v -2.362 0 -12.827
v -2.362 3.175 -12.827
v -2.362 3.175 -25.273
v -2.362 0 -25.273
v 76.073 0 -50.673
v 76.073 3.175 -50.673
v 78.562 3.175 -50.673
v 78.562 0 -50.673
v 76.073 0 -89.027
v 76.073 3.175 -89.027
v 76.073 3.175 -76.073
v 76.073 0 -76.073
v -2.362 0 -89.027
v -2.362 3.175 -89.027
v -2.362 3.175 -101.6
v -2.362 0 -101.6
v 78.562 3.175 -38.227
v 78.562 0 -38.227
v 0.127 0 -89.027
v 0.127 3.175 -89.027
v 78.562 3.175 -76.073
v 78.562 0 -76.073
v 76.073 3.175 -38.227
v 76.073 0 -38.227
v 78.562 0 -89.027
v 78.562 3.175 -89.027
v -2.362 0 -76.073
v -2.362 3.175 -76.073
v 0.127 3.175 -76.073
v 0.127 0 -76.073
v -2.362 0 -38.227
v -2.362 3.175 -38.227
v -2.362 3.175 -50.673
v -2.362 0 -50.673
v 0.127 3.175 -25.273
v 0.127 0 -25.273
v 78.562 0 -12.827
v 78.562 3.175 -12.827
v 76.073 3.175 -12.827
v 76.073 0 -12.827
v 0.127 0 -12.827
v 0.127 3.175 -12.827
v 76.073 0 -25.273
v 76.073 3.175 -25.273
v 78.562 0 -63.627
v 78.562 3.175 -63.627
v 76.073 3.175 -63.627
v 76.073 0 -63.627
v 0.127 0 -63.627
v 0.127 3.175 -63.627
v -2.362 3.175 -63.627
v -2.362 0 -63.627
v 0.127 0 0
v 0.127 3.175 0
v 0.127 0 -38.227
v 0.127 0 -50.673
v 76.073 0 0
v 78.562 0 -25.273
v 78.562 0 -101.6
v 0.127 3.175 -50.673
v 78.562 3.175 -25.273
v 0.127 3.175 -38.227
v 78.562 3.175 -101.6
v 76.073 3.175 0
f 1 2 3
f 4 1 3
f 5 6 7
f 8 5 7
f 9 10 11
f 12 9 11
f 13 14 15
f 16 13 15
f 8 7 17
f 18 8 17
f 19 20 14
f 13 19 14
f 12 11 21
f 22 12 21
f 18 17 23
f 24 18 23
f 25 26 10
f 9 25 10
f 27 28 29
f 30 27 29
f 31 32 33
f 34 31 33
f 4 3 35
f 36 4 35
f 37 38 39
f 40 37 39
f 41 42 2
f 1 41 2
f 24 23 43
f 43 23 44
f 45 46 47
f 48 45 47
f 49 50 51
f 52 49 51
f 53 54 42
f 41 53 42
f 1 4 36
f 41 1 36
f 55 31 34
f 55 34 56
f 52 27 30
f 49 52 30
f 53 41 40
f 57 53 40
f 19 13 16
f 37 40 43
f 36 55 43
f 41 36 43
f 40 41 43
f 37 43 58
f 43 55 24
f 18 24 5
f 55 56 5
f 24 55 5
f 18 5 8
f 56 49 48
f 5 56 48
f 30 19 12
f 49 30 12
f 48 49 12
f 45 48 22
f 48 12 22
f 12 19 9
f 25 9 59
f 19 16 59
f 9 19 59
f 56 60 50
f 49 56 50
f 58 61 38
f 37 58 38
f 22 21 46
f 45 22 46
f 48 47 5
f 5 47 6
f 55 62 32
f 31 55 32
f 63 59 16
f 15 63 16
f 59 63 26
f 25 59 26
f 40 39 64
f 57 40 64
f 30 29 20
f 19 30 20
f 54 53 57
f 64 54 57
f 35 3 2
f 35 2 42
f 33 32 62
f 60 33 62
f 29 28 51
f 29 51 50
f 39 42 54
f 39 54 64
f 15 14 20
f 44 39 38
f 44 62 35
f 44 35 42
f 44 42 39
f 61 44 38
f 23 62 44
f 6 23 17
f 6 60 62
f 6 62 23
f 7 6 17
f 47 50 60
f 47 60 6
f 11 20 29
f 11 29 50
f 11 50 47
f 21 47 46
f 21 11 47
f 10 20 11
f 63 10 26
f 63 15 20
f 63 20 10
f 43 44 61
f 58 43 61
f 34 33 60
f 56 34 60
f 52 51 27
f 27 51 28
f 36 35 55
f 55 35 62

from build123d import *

# Parameters (mm, degrees)
BOSS_EXTRUDE1_DEPTH = 3.175
CUT_EXTRUDE1_DEPTH  = 4.175


with BuildPart() as part:
    # Sketch1 → Boss-Extrude1 (new body)
    with BuildSketch(Plane(origin=(0, 0, 0), x_dir=(1, 0, 0), z_dir=(0, 1, 0))):
        Polygon((0, 0), (76.2, 0), (76.2, 12.7), (78.6892, 12.7), (78.6892, 25.4), (76.2, 25.4), (76.2, 38.1), (78.6892, 38.1), (78.6892, 50.8), (76.2, 50.8), (76.2, 63.5), (78.6892, 63.5), (78.6892, 76.2), (76.2, 76.2), (76.2, 88.9), (78.6892, 88.9), (78.6892, 101.6), (-2.4892, 101.6), (-2.4892, 88.9), (0, 88.9), (0, 76.2), (-2.4892, 76.2), (-2.4892, 63.5), (0, 63.5), (0, 50.8), (-2.4892, 50.8), (-2.4892, 38.1), (0, 38.1), (0, 25.4), (-2.4892, 25.4), (-2.4892, 12.7), (0, 12.7), align=None)
    extrude(amount=BOSS_EXTRUDE1_DEPTH)

    # Sketch2 → Cut-Extrude1 (cut, through all)
    with BuildSketch(Plane(origin=(0, 3.175, 0), x_dir=(1, 0, 0), z_dir=(0, 1, 0))):
        Polygon((78.6892, 101.6), (78.5622, 101.6), (78.5622, 89.027), (76.073, 89.027), (76.073, 76.073), (78.5622, 76.073), (78.5622, 63.627), (76.073, 63.627), (76.073, 50.673), (78.5622, 50.673), (78.5622, 38.227), (76.073, 38.227), (76.073, 25.273), (78.5622, 25.273), (78.5622, 12.827), (76.073, 12.827), (76.073, 0), (76.2, 0), (76.2, 12.7), (78.6892, 12.7), (78.6892, 25.4), (76.2, 25.4), (76.2, 38.1), (78.6892, 38.1), (78.6892, 50.8), (76.2, 50.8), (76.2, 63.5), (78.6892, 63.5), (78.6892, 76.2), (76.2, 76.2), (76.2, 88.9), (78.6892, 88.9), align=None)
        Polygon((-2.3622, 101.6), (-2.4892, 101.6), (-2.4892, 88.9), (0, 88.9), (0, 76.2), (-2.4892, 76.2), (-2.4892, 63.5), (0, 63.5), (0, 50.8), (-2.4892, 50.8), (-2.4892, 38.1), (0, 38.1), (0, 25.4), (-2.4892, 25.4), (-2.4892, 12.7), (0, 12.7), (0, 0), (0.127, 0), (0.127, 12.827), (-2.3622, 12.827), (-2.3622, 25.273), (0.127, 25.273), (0.127, 38.227), (-2.3622, 38.227), (-2.3622, 50.673), (0.127, 50.673), (0.127, 63.627), (-2.3622, 63.627), (-2.3622, 76.073), (0.127, 76.073), (0.127, 89.027), (-2.3622, 89.027), align=None)
    extrude(amount=-CUT_EXTRUDE1_DEPTH, mode=Mode.SUBTRACT)


solid = part.part
